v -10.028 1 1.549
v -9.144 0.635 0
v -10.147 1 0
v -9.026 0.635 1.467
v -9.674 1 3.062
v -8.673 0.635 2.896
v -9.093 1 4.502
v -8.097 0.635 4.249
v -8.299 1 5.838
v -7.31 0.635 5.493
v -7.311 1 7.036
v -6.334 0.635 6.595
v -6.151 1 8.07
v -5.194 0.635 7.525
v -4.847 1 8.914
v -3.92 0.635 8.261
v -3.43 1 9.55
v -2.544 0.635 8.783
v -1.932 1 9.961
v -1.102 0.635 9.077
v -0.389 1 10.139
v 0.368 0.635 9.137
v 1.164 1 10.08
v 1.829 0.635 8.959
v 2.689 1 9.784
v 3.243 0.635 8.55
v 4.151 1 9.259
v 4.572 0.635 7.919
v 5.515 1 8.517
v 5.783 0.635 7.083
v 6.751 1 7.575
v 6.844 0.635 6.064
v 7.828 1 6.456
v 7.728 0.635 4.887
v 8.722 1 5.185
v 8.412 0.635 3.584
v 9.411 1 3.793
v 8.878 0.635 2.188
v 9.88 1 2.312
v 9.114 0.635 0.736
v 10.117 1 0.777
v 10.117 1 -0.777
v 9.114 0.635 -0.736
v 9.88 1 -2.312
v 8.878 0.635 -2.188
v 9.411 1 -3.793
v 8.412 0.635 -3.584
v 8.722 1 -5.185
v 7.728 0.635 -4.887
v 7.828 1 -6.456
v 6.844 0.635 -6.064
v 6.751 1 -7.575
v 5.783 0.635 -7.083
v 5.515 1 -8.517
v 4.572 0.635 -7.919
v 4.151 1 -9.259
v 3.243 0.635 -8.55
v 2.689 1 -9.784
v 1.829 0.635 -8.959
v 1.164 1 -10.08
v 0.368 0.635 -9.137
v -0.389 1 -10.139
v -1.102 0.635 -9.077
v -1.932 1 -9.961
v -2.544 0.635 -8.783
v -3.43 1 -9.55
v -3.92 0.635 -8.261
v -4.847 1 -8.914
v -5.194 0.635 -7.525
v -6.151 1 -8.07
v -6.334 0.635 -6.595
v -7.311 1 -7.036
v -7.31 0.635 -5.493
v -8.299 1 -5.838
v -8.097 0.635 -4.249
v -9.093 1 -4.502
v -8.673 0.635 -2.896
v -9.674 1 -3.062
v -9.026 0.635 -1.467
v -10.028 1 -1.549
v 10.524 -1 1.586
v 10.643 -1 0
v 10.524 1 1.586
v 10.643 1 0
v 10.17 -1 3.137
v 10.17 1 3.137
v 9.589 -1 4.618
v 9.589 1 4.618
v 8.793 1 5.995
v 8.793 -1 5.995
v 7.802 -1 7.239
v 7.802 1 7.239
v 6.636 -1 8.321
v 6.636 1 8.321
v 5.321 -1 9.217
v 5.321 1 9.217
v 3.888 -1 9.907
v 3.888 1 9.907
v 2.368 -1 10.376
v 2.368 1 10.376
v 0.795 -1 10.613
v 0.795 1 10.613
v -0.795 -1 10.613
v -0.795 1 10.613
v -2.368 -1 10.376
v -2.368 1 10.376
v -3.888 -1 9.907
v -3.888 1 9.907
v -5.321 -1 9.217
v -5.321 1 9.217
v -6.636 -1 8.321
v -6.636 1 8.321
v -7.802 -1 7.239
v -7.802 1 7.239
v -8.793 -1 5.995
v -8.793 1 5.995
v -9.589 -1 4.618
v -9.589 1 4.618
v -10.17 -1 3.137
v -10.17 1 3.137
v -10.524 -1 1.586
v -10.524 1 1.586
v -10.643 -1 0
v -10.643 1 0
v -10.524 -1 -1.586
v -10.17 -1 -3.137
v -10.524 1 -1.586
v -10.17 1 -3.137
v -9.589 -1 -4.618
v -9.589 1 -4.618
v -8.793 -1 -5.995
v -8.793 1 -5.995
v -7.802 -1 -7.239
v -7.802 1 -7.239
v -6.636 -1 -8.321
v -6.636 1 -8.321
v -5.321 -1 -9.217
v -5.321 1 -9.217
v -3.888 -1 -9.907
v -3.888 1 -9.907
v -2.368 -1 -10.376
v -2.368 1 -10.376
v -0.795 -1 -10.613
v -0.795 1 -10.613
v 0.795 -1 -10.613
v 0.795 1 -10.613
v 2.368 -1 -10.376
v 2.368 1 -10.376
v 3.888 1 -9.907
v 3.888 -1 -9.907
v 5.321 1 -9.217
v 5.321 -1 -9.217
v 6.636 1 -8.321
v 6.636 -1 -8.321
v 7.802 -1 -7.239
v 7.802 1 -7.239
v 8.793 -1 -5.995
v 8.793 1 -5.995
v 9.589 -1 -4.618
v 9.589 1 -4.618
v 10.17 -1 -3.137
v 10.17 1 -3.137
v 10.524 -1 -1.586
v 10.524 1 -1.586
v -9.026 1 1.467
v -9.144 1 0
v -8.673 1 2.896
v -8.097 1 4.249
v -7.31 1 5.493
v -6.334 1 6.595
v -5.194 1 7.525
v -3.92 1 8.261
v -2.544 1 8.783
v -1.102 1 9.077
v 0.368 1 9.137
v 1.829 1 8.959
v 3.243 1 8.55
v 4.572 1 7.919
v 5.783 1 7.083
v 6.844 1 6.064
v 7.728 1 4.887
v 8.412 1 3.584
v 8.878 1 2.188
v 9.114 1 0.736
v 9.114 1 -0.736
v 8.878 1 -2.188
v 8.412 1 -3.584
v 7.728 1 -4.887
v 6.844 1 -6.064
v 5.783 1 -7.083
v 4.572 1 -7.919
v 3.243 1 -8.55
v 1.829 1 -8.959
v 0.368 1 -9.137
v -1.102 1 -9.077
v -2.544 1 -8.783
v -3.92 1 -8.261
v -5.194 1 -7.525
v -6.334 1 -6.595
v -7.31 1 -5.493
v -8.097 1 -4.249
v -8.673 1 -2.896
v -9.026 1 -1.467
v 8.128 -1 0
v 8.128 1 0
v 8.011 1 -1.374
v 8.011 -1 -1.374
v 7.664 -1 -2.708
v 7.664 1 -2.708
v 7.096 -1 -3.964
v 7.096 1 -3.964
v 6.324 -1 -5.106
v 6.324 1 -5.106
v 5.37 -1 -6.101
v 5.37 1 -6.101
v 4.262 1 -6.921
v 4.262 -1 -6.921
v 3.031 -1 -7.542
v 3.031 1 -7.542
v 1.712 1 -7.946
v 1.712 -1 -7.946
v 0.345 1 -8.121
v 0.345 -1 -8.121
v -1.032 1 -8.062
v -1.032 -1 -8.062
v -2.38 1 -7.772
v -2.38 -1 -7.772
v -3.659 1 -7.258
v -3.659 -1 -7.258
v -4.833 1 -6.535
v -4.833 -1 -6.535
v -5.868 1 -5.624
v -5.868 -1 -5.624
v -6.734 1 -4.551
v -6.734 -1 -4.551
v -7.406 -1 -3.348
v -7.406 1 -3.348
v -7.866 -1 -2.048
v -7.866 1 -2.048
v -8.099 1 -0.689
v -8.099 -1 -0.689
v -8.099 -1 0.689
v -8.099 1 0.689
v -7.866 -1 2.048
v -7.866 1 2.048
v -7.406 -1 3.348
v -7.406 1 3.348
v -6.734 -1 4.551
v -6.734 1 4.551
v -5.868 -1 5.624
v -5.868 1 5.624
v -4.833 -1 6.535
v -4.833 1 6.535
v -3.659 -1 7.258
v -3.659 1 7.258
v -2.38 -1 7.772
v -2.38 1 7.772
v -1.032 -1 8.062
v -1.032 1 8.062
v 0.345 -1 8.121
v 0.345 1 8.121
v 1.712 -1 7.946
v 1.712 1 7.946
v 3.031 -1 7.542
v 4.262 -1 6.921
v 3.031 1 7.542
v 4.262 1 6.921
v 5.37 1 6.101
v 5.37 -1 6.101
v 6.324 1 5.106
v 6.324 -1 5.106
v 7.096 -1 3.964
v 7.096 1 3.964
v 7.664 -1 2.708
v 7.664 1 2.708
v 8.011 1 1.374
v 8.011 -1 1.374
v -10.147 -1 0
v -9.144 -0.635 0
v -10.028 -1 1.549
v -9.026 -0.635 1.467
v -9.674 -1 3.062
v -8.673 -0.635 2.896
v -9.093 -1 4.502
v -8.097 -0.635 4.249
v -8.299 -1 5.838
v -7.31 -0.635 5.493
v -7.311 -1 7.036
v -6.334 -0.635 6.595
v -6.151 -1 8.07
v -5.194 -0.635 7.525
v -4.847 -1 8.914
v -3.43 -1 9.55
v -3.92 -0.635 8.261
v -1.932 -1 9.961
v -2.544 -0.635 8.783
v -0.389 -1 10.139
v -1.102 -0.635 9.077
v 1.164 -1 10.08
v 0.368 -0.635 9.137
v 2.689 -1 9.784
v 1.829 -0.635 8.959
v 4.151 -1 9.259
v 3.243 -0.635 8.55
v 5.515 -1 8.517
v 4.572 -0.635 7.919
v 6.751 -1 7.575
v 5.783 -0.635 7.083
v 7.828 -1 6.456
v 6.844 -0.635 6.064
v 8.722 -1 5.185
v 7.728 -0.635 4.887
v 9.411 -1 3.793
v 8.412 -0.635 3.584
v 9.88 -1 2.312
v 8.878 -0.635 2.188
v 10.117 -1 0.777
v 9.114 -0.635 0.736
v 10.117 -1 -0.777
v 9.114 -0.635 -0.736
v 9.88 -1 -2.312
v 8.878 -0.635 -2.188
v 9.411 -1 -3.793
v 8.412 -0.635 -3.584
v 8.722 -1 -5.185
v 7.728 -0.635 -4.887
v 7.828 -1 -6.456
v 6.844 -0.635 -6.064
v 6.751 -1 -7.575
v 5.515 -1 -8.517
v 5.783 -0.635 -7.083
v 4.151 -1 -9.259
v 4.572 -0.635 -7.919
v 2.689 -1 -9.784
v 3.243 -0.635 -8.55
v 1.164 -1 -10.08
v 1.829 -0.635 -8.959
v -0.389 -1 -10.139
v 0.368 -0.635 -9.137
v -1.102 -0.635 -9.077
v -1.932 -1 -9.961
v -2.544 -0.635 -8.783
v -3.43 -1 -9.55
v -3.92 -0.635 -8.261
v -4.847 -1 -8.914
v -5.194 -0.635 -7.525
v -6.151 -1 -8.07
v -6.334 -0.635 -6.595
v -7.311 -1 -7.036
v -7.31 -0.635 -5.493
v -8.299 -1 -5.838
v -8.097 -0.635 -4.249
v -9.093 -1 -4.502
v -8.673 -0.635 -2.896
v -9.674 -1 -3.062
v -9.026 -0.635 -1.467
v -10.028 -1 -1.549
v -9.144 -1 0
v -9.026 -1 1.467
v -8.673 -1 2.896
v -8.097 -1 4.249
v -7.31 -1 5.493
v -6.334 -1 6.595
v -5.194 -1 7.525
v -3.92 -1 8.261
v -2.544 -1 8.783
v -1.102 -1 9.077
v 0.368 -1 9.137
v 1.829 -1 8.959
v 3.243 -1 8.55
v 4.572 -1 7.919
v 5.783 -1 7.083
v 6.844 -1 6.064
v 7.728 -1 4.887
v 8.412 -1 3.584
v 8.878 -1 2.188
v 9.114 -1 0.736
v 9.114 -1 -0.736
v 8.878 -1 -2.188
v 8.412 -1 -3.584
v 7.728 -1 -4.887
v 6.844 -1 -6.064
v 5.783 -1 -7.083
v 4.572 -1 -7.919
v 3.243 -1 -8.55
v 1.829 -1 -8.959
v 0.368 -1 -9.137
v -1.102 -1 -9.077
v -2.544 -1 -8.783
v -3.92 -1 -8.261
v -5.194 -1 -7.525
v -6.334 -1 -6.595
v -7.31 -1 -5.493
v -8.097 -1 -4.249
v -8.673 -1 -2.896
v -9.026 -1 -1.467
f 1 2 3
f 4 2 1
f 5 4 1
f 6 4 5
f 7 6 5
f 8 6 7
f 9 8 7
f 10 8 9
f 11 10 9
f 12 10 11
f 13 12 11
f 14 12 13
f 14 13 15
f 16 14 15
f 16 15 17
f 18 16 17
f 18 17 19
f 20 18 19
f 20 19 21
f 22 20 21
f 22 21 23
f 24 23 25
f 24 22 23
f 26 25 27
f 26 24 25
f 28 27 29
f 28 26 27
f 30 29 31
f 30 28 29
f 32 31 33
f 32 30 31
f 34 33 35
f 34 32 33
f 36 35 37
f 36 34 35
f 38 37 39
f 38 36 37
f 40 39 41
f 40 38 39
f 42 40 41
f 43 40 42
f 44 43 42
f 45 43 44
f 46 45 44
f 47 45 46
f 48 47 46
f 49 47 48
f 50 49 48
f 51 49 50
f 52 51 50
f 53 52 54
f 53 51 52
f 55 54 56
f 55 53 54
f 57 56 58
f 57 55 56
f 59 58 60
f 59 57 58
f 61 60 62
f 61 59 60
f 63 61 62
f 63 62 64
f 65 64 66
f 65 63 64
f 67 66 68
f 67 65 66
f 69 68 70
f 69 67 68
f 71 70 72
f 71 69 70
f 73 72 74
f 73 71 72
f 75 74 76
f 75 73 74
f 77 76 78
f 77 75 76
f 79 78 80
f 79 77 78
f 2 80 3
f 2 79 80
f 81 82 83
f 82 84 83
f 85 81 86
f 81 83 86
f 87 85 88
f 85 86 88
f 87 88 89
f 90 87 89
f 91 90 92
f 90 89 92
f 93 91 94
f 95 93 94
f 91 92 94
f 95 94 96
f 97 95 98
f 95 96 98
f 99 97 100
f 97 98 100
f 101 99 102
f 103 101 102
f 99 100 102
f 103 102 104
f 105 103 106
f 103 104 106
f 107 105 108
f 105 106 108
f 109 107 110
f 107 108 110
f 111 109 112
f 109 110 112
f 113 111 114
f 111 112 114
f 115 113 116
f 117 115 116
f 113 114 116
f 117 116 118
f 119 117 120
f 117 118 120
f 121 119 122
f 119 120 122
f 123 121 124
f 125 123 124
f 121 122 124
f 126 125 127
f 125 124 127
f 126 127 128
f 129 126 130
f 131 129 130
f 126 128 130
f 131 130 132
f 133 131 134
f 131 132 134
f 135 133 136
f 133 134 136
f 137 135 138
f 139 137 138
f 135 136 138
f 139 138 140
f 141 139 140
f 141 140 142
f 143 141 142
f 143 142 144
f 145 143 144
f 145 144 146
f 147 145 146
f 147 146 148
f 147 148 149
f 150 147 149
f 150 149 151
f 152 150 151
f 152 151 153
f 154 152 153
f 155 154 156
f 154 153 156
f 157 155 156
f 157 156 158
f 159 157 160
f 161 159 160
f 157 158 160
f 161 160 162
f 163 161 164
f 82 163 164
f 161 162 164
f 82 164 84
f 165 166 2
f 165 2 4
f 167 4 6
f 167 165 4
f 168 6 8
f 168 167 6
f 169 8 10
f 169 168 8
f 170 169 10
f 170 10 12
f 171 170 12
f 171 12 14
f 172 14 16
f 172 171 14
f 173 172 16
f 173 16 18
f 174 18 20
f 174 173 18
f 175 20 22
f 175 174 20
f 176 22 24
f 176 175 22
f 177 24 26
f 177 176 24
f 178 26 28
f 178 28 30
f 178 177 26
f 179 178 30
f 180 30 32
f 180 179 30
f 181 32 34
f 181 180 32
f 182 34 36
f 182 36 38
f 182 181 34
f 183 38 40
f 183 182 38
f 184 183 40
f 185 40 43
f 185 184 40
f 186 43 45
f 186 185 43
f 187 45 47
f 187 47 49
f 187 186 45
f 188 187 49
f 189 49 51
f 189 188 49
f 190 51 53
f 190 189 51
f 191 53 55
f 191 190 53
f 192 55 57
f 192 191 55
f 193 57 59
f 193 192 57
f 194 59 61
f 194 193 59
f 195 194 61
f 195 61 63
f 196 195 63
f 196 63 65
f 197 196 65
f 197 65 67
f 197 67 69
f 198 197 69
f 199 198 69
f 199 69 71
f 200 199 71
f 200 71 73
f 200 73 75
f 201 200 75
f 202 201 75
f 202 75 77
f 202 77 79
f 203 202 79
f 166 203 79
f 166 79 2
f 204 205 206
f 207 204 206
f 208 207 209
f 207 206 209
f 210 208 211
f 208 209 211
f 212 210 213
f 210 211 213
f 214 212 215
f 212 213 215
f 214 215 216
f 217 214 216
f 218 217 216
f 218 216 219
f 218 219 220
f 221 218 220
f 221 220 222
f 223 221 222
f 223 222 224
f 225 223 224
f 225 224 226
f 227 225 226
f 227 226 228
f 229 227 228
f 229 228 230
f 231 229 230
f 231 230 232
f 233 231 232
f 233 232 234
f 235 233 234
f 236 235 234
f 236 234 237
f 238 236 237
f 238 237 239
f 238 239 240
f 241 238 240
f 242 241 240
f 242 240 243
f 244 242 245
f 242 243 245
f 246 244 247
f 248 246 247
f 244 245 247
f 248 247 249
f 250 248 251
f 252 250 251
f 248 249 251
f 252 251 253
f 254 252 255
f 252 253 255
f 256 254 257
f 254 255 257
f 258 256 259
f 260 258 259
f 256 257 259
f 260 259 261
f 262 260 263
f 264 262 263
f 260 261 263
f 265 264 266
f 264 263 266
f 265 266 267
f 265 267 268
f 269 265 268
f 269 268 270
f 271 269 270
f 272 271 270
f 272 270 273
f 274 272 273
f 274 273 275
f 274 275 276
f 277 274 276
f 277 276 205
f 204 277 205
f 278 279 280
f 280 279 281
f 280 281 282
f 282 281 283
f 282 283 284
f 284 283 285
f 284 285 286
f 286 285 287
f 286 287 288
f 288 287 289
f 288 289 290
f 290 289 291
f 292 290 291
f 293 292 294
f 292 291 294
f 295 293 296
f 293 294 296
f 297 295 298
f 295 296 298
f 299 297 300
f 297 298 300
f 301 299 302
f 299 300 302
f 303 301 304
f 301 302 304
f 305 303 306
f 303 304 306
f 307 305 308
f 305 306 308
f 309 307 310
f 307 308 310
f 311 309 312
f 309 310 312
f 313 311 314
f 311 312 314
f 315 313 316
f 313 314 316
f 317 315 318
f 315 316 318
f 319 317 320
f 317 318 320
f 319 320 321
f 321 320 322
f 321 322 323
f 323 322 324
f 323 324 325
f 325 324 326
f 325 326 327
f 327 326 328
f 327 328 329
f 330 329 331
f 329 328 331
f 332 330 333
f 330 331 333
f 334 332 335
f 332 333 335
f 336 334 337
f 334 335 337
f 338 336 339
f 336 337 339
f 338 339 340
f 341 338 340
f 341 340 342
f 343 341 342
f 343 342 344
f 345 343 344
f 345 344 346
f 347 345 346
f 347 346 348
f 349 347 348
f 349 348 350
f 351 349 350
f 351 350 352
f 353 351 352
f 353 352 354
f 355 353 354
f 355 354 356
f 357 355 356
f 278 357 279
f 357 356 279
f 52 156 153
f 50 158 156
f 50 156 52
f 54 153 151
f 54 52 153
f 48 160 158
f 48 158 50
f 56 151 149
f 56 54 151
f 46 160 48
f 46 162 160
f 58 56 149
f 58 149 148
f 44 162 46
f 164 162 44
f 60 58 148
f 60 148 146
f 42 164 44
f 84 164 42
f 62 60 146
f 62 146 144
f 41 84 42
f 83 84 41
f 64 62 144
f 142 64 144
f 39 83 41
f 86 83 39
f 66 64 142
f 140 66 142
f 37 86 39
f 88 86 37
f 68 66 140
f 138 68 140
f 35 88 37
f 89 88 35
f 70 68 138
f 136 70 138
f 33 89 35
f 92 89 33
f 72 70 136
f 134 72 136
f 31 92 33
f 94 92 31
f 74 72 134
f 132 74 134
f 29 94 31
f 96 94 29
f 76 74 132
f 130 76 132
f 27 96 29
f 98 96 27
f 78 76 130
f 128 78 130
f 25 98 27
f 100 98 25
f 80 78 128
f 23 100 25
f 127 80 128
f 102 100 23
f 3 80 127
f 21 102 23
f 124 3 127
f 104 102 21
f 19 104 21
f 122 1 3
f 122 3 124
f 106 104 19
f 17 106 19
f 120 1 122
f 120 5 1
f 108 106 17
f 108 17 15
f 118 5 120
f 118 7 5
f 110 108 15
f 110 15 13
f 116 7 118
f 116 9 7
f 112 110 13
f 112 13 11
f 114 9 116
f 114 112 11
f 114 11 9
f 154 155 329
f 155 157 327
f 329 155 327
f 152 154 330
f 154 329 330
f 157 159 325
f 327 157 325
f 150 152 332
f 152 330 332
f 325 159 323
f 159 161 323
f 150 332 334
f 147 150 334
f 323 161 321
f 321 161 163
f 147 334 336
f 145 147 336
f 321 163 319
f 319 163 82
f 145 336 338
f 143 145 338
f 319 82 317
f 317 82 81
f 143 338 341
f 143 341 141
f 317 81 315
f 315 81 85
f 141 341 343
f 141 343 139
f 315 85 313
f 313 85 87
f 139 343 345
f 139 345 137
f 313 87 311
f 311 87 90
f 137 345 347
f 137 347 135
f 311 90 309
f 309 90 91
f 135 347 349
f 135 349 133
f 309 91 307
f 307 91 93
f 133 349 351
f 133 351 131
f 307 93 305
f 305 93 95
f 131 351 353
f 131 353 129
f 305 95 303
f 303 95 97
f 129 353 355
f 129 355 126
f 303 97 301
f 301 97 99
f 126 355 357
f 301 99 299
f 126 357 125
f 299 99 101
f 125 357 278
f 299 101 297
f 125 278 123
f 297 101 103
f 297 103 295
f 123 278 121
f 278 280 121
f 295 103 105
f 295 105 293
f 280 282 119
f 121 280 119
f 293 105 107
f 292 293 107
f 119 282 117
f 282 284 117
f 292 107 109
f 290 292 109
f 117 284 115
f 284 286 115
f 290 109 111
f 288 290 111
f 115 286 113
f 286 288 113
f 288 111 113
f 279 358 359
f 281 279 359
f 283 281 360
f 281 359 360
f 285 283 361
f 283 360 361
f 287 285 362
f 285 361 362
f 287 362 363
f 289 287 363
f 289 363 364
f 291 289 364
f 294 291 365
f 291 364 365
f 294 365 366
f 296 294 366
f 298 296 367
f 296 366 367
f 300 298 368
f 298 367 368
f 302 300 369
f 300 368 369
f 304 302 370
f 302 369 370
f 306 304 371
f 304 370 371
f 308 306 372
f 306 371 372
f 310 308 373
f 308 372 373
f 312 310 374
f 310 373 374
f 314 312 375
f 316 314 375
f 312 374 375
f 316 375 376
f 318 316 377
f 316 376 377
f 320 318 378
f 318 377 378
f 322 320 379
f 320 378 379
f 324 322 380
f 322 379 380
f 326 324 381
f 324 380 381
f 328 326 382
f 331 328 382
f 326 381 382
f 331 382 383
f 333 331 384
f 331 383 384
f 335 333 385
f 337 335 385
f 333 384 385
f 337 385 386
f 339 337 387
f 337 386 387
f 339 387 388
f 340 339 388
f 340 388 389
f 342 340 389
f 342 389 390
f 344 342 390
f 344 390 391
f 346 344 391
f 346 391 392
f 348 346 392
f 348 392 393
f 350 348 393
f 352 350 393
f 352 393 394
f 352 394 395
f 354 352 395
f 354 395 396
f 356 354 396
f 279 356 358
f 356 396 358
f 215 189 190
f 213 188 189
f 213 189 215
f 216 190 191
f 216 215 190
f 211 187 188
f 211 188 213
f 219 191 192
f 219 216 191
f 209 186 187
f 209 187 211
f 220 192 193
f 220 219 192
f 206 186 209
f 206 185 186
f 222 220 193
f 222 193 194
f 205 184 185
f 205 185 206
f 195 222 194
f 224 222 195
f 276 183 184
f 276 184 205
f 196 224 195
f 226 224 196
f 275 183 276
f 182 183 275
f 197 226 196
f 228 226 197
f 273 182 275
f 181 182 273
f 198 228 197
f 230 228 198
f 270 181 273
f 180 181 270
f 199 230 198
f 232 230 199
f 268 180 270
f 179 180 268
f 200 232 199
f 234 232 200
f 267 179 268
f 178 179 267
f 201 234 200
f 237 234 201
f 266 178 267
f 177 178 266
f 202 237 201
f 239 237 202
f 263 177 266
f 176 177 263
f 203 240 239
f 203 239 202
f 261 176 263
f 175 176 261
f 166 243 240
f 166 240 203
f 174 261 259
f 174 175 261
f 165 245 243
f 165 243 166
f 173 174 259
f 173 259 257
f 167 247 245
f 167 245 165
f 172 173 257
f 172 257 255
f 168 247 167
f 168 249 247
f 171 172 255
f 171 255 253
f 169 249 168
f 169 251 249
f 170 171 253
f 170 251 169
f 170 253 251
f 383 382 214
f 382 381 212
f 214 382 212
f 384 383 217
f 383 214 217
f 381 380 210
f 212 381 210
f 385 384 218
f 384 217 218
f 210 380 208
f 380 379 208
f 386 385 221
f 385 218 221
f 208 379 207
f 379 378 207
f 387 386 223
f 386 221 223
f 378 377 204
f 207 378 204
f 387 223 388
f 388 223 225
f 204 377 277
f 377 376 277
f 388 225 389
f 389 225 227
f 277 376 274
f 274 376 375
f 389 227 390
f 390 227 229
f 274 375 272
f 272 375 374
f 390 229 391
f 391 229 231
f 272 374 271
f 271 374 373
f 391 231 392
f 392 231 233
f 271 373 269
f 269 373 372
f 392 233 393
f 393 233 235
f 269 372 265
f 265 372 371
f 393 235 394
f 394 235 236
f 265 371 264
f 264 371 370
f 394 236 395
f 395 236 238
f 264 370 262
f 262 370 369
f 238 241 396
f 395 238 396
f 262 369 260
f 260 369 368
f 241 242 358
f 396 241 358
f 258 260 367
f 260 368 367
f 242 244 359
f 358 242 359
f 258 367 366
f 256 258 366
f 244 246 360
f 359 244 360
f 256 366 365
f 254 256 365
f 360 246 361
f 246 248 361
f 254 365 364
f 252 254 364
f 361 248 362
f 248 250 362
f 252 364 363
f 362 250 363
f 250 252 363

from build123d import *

# Parameters (mm, degrees)
SKETCH1_W          = 10.6426
SKETCH1_H          = 1.999996
SKETCH3_R          = 8.128
CUT_EXTRUDE1_DEPTH = 2.999996


with BuildPart() as part:
    # Sketch1 → Revolve1 (revolve)
    with BuildSketch(Plane.XY):
        with Locations((5.3213, 0)):
            Rectangle(SKETCH1_W, SKETCH1_H)
    revolve(axis=Axis((0, 0.999998, 0), (0, -1, 0)))

    # Sketch2 → Cut-Revolve1 (revolve, cut)
    with BuildSketch(Plane.XY):
        Polygon((-9.144, 0.635), (-9.144, 1.217425169), (-10.7442, 1.217425169), align=None)
        Polygon((-10.7442, -1.217425169), (-9.144, -0.635), (-9.144, -1.217425169), align=None)
    revolve(axis=Axis((0, 0, 0), (0, 1, 0)), mode=Mode.SUBTRACT)

    # Sketch3 → Cut-Extrude1 (cut, through all)
    with BuildSketch(Plane(origin=(0, 0.999998, 0), x_dir=(1, 0, 0), z_dir=(0, 1, 0))):
        Circle(SKETCH3_R)
    extrude(amount=-CUT_EXTRUDE1_DEPTH, mode=Mode.SUBTRACT)


solid = part.part
